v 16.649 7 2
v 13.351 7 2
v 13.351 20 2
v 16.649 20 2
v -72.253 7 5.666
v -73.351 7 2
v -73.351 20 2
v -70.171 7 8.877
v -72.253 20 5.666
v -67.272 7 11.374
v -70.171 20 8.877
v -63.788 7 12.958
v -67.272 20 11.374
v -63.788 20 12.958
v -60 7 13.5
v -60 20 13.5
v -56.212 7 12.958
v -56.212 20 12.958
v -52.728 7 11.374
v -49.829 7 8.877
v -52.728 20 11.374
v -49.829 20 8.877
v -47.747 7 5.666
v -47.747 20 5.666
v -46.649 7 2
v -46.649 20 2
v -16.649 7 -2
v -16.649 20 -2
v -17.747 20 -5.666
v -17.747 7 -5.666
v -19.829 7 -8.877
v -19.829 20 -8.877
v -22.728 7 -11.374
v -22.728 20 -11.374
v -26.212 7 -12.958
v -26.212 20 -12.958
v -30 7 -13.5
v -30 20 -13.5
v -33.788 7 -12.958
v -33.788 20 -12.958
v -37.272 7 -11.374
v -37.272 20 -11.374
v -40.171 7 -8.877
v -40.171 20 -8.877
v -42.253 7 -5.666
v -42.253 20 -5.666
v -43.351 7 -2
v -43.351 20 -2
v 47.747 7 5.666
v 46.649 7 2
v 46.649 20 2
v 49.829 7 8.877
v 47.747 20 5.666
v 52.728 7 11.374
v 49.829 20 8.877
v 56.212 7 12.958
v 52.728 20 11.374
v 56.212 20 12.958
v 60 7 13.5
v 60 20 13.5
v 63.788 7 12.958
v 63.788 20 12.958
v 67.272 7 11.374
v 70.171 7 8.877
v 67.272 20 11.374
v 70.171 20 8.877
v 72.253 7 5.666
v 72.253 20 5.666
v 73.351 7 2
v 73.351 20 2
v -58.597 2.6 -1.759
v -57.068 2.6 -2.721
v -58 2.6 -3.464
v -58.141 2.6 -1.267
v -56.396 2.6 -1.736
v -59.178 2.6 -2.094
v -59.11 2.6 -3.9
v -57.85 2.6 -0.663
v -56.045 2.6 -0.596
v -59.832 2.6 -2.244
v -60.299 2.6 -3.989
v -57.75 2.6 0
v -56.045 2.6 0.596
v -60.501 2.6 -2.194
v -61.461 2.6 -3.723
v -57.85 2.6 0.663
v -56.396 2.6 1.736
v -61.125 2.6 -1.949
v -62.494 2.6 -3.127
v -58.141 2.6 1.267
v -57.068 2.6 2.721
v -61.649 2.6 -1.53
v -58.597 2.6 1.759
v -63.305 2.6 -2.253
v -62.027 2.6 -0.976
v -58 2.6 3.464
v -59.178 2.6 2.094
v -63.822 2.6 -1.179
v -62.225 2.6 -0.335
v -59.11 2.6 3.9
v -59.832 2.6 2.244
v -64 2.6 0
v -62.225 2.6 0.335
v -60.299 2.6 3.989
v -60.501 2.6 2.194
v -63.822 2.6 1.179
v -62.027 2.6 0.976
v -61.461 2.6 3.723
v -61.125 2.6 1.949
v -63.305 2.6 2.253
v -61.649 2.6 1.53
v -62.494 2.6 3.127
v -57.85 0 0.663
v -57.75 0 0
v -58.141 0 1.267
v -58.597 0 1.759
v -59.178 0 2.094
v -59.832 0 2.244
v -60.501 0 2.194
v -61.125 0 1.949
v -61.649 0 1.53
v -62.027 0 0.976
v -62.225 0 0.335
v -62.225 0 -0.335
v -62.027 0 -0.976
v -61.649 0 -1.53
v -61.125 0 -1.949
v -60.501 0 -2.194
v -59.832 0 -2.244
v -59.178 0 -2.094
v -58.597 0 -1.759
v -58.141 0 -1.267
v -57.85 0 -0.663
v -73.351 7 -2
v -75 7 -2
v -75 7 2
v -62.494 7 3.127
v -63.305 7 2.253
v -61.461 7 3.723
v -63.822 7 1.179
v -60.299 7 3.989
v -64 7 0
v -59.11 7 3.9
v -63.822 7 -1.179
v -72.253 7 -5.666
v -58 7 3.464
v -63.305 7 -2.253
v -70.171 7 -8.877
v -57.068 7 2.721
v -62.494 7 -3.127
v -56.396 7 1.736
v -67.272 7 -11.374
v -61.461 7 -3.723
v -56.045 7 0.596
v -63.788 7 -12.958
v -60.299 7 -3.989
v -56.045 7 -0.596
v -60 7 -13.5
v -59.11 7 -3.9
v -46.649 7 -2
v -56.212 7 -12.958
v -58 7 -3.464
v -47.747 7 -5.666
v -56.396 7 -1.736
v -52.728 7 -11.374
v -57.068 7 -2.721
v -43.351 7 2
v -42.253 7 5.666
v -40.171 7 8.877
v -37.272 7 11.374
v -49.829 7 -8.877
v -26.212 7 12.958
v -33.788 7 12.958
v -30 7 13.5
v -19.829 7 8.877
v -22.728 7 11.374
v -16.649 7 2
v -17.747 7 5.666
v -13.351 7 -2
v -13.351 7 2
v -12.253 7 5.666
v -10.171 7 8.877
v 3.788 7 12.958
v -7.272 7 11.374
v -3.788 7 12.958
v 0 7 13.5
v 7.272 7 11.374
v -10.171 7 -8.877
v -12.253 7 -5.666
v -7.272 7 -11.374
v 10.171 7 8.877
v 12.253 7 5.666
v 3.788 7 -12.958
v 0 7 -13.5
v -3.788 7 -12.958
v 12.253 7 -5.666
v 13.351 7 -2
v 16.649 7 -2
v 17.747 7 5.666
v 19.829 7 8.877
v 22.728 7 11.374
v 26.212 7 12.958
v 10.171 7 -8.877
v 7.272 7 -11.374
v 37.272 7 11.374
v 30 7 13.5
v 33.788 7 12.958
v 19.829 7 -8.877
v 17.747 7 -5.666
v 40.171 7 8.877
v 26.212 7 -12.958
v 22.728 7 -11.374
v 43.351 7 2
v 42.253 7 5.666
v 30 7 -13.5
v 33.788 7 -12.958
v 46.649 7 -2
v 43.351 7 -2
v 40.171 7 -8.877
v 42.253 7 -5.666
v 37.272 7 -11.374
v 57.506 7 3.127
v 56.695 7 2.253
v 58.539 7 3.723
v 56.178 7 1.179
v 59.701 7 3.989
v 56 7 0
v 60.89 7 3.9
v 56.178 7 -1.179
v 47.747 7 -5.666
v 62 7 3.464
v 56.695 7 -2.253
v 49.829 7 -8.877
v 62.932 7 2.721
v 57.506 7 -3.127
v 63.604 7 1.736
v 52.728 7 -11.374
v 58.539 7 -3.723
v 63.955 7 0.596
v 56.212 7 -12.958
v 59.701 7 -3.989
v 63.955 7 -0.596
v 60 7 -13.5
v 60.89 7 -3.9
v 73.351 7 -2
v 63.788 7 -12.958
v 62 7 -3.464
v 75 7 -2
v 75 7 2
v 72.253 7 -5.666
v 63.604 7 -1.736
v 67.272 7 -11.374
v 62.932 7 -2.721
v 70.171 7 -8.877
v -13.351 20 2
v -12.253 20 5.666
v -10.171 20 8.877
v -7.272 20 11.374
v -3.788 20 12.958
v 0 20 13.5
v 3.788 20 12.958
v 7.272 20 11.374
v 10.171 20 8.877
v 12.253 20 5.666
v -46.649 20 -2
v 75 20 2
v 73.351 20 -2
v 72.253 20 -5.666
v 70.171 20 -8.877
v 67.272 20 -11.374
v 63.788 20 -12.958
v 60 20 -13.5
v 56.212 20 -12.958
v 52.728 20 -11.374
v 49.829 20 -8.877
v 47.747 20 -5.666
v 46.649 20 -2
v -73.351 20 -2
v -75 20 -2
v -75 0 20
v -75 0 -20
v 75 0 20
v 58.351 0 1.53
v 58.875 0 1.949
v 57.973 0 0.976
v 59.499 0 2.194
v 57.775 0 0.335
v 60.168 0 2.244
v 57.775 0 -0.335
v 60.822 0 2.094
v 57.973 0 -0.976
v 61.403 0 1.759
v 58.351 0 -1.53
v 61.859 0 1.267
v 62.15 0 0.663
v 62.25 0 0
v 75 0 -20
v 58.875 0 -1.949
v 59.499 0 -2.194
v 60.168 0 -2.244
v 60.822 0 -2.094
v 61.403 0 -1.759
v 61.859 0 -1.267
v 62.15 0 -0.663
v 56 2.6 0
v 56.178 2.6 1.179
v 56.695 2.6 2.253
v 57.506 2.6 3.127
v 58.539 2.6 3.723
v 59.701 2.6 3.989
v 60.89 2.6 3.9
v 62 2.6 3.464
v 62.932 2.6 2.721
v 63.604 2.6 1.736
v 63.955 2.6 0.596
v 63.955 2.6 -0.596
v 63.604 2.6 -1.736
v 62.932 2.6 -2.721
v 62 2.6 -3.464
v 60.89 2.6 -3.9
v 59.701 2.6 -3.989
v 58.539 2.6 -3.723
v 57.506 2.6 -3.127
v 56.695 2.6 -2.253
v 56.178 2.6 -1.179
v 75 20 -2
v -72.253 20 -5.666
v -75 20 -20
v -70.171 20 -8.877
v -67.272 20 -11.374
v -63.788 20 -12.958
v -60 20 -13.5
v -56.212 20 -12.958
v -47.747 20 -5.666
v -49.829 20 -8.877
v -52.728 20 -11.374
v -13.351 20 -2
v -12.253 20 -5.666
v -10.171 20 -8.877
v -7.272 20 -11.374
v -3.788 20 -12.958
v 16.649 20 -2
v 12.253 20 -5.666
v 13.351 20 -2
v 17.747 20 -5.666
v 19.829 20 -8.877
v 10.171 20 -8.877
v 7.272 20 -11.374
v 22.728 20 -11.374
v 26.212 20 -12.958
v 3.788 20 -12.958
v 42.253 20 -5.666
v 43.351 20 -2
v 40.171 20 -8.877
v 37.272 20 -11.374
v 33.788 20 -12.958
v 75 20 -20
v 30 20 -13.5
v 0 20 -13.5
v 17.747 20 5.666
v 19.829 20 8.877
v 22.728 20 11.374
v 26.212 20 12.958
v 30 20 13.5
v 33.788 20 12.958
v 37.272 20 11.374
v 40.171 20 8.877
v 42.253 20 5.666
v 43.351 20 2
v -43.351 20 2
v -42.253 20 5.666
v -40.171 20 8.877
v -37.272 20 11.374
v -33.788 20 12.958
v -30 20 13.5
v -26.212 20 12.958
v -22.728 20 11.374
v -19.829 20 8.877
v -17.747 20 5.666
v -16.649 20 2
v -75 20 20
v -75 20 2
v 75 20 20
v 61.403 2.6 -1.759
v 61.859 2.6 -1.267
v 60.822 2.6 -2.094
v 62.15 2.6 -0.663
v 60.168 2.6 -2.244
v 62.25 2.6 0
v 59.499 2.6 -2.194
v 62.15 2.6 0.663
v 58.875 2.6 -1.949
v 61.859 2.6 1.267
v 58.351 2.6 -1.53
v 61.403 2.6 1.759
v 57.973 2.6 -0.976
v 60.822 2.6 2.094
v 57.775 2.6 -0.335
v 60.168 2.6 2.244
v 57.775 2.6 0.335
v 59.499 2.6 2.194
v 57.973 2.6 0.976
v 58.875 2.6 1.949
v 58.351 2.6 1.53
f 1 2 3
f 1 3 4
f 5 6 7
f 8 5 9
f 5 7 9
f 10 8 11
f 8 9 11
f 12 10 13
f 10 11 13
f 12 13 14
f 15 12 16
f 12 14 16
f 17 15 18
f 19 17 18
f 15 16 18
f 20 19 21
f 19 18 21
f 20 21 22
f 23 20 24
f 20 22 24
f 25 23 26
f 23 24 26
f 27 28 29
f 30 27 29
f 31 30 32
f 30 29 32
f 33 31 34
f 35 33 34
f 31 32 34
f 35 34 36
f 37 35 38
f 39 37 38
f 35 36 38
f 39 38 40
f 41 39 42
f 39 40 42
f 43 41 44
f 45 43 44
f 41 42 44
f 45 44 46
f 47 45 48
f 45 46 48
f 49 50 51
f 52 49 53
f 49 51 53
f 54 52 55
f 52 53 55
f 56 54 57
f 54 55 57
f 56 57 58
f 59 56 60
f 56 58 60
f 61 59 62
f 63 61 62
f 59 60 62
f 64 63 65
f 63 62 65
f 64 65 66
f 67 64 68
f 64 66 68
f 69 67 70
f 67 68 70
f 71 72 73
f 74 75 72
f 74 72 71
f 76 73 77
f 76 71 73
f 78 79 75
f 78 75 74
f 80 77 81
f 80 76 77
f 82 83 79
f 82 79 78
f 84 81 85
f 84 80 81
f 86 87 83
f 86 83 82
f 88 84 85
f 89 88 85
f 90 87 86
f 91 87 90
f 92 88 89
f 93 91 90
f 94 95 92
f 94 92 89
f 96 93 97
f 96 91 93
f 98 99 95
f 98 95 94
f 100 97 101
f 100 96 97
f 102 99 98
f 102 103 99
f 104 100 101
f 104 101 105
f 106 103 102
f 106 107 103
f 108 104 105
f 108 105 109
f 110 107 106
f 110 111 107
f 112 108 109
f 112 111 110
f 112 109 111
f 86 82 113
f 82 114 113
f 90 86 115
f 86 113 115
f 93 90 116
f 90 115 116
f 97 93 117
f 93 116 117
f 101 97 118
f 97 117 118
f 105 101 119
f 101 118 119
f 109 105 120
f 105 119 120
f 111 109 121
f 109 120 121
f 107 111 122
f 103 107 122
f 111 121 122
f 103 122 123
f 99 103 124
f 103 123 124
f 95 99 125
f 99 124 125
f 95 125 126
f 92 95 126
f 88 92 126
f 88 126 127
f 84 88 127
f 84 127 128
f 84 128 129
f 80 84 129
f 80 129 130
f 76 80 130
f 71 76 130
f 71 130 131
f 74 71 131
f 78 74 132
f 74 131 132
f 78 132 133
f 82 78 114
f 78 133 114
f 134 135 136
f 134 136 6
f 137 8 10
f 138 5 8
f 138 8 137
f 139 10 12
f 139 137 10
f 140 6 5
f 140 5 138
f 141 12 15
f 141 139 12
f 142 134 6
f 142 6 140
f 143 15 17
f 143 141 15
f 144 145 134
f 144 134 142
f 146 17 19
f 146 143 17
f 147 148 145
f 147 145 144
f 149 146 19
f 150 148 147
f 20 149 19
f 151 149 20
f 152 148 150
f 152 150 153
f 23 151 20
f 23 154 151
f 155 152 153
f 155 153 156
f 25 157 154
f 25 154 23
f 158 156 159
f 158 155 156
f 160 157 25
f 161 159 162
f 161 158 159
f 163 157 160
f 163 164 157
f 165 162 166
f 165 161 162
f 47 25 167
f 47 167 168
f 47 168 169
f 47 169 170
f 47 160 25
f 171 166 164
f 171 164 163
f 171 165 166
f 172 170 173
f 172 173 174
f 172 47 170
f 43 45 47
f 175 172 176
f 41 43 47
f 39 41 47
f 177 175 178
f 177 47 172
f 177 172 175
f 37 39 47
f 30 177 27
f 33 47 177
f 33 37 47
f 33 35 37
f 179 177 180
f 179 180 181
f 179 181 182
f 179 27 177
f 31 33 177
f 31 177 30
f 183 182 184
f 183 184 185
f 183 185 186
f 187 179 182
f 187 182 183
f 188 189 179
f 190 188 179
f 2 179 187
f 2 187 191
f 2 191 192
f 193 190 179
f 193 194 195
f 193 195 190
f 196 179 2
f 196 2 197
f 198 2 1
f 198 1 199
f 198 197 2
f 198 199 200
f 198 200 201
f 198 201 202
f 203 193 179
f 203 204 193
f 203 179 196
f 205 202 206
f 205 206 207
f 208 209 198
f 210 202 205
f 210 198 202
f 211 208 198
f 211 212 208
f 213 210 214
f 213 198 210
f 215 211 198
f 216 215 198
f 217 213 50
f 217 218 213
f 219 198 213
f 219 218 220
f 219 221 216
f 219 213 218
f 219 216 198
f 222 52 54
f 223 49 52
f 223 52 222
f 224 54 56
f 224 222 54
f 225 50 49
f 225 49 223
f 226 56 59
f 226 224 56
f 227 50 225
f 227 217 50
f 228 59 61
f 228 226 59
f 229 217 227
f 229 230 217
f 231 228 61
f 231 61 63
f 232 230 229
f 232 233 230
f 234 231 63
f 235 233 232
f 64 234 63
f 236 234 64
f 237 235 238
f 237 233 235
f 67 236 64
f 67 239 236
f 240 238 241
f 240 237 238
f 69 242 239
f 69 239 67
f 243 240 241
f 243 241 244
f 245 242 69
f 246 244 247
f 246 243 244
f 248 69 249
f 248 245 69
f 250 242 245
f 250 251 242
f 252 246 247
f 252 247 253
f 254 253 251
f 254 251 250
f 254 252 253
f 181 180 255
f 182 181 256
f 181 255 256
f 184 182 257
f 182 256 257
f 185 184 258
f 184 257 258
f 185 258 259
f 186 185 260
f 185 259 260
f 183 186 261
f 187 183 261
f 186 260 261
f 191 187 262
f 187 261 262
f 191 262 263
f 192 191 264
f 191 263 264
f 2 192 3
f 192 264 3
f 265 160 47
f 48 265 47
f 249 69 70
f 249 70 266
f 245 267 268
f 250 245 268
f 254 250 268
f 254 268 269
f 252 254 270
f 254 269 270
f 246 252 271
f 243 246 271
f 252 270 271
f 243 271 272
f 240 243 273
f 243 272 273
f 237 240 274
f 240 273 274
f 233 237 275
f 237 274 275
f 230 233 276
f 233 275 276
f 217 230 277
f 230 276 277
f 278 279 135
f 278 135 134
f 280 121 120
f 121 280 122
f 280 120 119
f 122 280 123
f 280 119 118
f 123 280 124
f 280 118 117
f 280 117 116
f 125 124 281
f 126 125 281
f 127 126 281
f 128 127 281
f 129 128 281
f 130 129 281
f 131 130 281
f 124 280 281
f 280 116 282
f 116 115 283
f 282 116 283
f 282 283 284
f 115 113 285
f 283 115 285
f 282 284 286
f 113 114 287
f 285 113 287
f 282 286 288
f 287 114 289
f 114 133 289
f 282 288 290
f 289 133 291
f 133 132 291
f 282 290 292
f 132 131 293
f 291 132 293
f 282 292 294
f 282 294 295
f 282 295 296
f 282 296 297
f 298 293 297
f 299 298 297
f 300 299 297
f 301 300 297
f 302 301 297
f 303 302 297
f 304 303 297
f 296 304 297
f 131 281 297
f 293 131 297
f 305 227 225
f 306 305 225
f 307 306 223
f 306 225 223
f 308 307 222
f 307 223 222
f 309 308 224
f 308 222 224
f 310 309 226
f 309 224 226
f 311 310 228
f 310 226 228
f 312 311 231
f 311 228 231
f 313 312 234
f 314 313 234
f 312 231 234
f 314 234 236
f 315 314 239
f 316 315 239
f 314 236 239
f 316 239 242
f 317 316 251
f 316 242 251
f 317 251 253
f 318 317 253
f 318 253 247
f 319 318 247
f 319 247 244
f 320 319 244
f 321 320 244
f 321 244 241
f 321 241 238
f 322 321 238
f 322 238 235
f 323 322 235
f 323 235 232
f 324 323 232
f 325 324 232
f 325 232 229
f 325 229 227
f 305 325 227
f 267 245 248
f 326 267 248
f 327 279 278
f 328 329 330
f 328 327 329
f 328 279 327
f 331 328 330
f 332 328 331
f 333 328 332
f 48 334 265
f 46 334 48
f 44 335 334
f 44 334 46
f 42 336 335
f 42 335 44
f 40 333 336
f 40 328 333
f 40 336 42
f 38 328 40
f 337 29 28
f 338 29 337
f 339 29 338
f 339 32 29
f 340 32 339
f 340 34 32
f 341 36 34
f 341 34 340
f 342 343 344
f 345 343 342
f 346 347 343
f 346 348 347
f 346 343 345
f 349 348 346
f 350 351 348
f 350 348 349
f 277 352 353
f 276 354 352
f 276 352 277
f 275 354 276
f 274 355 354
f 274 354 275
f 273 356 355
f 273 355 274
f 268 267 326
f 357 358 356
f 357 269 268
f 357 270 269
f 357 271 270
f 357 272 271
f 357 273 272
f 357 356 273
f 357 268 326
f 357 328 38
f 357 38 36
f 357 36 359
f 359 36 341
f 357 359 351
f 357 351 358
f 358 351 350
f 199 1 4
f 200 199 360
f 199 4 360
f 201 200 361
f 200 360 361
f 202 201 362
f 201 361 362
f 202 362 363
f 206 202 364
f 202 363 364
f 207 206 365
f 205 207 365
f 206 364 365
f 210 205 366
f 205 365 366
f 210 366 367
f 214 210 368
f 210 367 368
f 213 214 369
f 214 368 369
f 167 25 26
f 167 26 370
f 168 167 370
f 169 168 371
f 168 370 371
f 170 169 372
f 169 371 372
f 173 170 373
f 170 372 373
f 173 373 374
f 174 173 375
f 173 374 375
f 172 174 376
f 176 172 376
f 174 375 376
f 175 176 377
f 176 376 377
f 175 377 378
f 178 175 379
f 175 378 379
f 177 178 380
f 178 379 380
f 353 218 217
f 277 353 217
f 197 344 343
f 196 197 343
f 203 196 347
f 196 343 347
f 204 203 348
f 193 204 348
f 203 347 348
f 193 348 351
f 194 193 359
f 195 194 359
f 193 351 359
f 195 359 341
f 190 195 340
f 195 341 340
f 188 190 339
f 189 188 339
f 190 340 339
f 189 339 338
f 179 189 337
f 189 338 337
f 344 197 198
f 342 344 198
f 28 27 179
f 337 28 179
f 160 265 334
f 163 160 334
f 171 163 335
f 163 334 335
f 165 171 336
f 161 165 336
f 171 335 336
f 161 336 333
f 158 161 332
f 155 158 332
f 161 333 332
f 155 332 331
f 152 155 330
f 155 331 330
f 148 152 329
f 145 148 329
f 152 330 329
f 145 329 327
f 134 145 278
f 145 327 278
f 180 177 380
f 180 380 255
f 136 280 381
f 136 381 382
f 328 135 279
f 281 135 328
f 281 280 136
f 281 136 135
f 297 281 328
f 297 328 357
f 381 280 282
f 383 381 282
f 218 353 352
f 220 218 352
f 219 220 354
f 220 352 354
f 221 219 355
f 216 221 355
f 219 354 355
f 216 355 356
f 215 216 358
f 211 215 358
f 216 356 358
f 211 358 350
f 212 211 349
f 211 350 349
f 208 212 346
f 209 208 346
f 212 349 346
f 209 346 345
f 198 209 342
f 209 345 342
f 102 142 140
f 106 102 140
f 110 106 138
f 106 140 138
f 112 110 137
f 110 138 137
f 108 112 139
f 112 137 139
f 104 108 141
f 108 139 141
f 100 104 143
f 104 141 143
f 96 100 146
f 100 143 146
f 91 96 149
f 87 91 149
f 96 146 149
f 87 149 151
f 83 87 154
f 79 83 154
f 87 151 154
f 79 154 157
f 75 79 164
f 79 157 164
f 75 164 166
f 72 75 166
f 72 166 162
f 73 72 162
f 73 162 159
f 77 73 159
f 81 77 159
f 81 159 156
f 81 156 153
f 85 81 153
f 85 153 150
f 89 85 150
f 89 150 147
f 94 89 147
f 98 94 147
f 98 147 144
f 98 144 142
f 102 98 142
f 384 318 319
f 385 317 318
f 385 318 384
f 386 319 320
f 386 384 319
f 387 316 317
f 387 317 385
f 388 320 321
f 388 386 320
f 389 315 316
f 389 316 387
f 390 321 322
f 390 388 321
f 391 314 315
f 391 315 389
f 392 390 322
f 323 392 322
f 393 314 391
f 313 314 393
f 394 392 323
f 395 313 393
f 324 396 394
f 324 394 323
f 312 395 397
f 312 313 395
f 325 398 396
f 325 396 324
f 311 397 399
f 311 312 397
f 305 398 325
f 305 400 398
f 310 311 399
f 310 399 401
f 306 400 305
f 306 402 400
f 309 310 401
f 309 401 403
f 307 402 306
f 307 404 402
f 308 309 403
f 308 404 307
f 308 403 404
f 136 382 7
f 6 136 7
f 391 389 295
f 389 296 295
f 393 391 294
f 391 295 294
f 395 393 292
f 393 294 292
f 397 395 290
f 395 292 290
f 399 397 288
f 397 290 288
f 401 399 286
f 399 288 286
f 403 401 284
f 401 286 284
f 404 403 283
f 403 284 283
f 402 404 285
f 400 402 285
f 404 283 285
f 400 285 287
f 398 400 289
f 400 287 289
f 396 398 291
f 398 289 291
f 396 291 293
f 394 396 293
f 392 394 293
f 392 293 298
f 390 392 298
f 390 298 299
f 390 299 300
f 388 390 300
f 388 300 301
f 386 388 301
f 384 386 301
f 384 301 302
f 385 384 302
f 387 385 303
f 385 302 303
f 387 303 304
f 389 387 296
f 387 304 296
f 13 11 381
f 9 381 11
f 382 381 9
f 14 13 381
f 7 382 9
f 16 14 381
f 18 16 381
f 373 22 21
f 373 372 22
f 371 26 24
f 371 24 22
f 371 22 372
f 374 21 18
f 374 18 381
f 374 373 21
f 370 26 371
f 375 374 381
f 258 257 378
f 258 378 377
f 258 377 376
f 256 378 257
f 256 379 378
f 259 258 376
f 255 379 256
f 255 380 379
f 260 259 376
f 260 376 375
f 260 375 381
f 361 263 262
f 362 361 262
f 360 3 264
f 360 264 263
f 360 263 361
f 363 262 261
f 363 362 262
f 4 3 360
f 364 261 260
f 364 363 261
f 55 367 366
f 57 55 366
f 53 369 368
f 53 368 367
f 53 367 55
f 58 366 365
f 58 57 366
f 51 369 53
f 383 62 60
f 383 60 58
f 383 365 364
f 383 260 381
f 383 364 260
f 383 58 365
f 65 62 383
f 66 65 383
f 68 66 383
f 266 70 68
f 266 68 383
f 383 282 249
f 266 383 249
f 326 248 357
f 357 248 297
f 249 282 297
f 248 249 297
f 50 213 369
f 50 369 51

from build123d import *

# Parameters (mm, degrees)
SKETCH2_W                                           = 150
SKETCH2_H                                           = 40
BOSS_EXTRUDE1_DEPTH                                 = 20
SKETCH3_R                                           = 13.5
CUT_EXTRUDE1_DEPTH                                  = 13
LPATTERN1_COUNT                                     = 5
LPATTERN1_PITCH                                     = 30
CBORE_FOR_M4_HEX_SOCKET_HEAD_CAP_SCREW1_D           = 4.5
CBORE_FOR_M4_HEX_SOCKET_HEAD_CAP_SCREW1_CBORE_D     = 8
CBORE_FOR_M4_HEX_SOCKET_HEAD_CAP_SCREW1_CBORE_DEPTH = 4.4
LPATTERN2_COUNT                                     = 2
LPATTERN2_PITCH                                     = 120
SKETCH7_W                                           = 181.12901383
SKETCH7_H                                           = 4
CUT_EXTRUDE3_DEPTH                                  = 13


with BuildPart() as part:
    # Sketch2 → Boss-Extrude1 (new body)
    with BuildSketch(Plane(origin=(0, 0, 0), x_dir=(1, 0, 0), z_dir=(0, 1, 0))):
        Rectangle(SKETCH2_W, SKETCH2_H)
    extrude(amount=BOSS_EXTRUDE1_DEPTH)

    # Sketch3 → Cut-Extrude1 (cut)
    with BuildSketch(Plane(origin=(0, 20, 0), x_dir=(1, 0, 0), z_dir=(0, 1, 0))):
        with Locations(Location((-60, 0, 0), (0, 0, 270))):
            Circle(SKETCH3_R)
    cut_extrude1 = extrude(amount=-CUT_EXTRUDE1_DEPTH, mode=Mode.SUBTRACT)

    # LPattern1: Cut-Extrude1 ×5
    with Locations(*[(i * LPATTERN1_PITCH, 0, 0) for i in range(1, LPATTERN1_COUNT)]):
        add(cut_extrude1, mode=Mode.SUBTRACT)

    # CBORE for M4 Hex Socket Head Cap Screw1 (through all)
    with Locations(Plane(origin=(0, 7, 0), x_dir=(-1, 0, 0), z_dir=(0, 1, 0))):
        with Locations((60, 0)):
            cbore_for_m4_hex_socket_head_cap_screw1 = CounterBoreHole(CBORE_FOR_M4_HEX_SOCKET_HEAD_CAP_SCREW1_D / 2, CBORE_FOR_M4_HEX_SOCKET_HEAD_CAP_SCREW1_CBORE_D / 2, CBORE_FOR_M4_HEX_SOCKET_HEAD_CAP_SCREW1_CBORE_DEPTH)

    # LPattern2: CBORE for M4 Hex Socket Head Cap Screw1 ×2
    with Locations(*[(i * LPATTERN2_PITCH, 0, 0) for i in range(1, LPATTERN2_COUNT)]):
        add(cbore_for_m4_hex_socket_head_cap_screw1, mode=Mode.SUBTRACT)

    # Sketch7 → Cut-Extrude3 (cut)
    with BuildSketch(Plane(origin=(0, 20, 0), x_dir=(1, 0, 0), z_dir=(0, 1, 0))):
        Rectangle(SKETCH7_W, SKETCH7_H)
    extrude(amount=-CUT_EXTRUDE3_DEPTH, mode=Mode.SUBTRACT)


solid = part.part
